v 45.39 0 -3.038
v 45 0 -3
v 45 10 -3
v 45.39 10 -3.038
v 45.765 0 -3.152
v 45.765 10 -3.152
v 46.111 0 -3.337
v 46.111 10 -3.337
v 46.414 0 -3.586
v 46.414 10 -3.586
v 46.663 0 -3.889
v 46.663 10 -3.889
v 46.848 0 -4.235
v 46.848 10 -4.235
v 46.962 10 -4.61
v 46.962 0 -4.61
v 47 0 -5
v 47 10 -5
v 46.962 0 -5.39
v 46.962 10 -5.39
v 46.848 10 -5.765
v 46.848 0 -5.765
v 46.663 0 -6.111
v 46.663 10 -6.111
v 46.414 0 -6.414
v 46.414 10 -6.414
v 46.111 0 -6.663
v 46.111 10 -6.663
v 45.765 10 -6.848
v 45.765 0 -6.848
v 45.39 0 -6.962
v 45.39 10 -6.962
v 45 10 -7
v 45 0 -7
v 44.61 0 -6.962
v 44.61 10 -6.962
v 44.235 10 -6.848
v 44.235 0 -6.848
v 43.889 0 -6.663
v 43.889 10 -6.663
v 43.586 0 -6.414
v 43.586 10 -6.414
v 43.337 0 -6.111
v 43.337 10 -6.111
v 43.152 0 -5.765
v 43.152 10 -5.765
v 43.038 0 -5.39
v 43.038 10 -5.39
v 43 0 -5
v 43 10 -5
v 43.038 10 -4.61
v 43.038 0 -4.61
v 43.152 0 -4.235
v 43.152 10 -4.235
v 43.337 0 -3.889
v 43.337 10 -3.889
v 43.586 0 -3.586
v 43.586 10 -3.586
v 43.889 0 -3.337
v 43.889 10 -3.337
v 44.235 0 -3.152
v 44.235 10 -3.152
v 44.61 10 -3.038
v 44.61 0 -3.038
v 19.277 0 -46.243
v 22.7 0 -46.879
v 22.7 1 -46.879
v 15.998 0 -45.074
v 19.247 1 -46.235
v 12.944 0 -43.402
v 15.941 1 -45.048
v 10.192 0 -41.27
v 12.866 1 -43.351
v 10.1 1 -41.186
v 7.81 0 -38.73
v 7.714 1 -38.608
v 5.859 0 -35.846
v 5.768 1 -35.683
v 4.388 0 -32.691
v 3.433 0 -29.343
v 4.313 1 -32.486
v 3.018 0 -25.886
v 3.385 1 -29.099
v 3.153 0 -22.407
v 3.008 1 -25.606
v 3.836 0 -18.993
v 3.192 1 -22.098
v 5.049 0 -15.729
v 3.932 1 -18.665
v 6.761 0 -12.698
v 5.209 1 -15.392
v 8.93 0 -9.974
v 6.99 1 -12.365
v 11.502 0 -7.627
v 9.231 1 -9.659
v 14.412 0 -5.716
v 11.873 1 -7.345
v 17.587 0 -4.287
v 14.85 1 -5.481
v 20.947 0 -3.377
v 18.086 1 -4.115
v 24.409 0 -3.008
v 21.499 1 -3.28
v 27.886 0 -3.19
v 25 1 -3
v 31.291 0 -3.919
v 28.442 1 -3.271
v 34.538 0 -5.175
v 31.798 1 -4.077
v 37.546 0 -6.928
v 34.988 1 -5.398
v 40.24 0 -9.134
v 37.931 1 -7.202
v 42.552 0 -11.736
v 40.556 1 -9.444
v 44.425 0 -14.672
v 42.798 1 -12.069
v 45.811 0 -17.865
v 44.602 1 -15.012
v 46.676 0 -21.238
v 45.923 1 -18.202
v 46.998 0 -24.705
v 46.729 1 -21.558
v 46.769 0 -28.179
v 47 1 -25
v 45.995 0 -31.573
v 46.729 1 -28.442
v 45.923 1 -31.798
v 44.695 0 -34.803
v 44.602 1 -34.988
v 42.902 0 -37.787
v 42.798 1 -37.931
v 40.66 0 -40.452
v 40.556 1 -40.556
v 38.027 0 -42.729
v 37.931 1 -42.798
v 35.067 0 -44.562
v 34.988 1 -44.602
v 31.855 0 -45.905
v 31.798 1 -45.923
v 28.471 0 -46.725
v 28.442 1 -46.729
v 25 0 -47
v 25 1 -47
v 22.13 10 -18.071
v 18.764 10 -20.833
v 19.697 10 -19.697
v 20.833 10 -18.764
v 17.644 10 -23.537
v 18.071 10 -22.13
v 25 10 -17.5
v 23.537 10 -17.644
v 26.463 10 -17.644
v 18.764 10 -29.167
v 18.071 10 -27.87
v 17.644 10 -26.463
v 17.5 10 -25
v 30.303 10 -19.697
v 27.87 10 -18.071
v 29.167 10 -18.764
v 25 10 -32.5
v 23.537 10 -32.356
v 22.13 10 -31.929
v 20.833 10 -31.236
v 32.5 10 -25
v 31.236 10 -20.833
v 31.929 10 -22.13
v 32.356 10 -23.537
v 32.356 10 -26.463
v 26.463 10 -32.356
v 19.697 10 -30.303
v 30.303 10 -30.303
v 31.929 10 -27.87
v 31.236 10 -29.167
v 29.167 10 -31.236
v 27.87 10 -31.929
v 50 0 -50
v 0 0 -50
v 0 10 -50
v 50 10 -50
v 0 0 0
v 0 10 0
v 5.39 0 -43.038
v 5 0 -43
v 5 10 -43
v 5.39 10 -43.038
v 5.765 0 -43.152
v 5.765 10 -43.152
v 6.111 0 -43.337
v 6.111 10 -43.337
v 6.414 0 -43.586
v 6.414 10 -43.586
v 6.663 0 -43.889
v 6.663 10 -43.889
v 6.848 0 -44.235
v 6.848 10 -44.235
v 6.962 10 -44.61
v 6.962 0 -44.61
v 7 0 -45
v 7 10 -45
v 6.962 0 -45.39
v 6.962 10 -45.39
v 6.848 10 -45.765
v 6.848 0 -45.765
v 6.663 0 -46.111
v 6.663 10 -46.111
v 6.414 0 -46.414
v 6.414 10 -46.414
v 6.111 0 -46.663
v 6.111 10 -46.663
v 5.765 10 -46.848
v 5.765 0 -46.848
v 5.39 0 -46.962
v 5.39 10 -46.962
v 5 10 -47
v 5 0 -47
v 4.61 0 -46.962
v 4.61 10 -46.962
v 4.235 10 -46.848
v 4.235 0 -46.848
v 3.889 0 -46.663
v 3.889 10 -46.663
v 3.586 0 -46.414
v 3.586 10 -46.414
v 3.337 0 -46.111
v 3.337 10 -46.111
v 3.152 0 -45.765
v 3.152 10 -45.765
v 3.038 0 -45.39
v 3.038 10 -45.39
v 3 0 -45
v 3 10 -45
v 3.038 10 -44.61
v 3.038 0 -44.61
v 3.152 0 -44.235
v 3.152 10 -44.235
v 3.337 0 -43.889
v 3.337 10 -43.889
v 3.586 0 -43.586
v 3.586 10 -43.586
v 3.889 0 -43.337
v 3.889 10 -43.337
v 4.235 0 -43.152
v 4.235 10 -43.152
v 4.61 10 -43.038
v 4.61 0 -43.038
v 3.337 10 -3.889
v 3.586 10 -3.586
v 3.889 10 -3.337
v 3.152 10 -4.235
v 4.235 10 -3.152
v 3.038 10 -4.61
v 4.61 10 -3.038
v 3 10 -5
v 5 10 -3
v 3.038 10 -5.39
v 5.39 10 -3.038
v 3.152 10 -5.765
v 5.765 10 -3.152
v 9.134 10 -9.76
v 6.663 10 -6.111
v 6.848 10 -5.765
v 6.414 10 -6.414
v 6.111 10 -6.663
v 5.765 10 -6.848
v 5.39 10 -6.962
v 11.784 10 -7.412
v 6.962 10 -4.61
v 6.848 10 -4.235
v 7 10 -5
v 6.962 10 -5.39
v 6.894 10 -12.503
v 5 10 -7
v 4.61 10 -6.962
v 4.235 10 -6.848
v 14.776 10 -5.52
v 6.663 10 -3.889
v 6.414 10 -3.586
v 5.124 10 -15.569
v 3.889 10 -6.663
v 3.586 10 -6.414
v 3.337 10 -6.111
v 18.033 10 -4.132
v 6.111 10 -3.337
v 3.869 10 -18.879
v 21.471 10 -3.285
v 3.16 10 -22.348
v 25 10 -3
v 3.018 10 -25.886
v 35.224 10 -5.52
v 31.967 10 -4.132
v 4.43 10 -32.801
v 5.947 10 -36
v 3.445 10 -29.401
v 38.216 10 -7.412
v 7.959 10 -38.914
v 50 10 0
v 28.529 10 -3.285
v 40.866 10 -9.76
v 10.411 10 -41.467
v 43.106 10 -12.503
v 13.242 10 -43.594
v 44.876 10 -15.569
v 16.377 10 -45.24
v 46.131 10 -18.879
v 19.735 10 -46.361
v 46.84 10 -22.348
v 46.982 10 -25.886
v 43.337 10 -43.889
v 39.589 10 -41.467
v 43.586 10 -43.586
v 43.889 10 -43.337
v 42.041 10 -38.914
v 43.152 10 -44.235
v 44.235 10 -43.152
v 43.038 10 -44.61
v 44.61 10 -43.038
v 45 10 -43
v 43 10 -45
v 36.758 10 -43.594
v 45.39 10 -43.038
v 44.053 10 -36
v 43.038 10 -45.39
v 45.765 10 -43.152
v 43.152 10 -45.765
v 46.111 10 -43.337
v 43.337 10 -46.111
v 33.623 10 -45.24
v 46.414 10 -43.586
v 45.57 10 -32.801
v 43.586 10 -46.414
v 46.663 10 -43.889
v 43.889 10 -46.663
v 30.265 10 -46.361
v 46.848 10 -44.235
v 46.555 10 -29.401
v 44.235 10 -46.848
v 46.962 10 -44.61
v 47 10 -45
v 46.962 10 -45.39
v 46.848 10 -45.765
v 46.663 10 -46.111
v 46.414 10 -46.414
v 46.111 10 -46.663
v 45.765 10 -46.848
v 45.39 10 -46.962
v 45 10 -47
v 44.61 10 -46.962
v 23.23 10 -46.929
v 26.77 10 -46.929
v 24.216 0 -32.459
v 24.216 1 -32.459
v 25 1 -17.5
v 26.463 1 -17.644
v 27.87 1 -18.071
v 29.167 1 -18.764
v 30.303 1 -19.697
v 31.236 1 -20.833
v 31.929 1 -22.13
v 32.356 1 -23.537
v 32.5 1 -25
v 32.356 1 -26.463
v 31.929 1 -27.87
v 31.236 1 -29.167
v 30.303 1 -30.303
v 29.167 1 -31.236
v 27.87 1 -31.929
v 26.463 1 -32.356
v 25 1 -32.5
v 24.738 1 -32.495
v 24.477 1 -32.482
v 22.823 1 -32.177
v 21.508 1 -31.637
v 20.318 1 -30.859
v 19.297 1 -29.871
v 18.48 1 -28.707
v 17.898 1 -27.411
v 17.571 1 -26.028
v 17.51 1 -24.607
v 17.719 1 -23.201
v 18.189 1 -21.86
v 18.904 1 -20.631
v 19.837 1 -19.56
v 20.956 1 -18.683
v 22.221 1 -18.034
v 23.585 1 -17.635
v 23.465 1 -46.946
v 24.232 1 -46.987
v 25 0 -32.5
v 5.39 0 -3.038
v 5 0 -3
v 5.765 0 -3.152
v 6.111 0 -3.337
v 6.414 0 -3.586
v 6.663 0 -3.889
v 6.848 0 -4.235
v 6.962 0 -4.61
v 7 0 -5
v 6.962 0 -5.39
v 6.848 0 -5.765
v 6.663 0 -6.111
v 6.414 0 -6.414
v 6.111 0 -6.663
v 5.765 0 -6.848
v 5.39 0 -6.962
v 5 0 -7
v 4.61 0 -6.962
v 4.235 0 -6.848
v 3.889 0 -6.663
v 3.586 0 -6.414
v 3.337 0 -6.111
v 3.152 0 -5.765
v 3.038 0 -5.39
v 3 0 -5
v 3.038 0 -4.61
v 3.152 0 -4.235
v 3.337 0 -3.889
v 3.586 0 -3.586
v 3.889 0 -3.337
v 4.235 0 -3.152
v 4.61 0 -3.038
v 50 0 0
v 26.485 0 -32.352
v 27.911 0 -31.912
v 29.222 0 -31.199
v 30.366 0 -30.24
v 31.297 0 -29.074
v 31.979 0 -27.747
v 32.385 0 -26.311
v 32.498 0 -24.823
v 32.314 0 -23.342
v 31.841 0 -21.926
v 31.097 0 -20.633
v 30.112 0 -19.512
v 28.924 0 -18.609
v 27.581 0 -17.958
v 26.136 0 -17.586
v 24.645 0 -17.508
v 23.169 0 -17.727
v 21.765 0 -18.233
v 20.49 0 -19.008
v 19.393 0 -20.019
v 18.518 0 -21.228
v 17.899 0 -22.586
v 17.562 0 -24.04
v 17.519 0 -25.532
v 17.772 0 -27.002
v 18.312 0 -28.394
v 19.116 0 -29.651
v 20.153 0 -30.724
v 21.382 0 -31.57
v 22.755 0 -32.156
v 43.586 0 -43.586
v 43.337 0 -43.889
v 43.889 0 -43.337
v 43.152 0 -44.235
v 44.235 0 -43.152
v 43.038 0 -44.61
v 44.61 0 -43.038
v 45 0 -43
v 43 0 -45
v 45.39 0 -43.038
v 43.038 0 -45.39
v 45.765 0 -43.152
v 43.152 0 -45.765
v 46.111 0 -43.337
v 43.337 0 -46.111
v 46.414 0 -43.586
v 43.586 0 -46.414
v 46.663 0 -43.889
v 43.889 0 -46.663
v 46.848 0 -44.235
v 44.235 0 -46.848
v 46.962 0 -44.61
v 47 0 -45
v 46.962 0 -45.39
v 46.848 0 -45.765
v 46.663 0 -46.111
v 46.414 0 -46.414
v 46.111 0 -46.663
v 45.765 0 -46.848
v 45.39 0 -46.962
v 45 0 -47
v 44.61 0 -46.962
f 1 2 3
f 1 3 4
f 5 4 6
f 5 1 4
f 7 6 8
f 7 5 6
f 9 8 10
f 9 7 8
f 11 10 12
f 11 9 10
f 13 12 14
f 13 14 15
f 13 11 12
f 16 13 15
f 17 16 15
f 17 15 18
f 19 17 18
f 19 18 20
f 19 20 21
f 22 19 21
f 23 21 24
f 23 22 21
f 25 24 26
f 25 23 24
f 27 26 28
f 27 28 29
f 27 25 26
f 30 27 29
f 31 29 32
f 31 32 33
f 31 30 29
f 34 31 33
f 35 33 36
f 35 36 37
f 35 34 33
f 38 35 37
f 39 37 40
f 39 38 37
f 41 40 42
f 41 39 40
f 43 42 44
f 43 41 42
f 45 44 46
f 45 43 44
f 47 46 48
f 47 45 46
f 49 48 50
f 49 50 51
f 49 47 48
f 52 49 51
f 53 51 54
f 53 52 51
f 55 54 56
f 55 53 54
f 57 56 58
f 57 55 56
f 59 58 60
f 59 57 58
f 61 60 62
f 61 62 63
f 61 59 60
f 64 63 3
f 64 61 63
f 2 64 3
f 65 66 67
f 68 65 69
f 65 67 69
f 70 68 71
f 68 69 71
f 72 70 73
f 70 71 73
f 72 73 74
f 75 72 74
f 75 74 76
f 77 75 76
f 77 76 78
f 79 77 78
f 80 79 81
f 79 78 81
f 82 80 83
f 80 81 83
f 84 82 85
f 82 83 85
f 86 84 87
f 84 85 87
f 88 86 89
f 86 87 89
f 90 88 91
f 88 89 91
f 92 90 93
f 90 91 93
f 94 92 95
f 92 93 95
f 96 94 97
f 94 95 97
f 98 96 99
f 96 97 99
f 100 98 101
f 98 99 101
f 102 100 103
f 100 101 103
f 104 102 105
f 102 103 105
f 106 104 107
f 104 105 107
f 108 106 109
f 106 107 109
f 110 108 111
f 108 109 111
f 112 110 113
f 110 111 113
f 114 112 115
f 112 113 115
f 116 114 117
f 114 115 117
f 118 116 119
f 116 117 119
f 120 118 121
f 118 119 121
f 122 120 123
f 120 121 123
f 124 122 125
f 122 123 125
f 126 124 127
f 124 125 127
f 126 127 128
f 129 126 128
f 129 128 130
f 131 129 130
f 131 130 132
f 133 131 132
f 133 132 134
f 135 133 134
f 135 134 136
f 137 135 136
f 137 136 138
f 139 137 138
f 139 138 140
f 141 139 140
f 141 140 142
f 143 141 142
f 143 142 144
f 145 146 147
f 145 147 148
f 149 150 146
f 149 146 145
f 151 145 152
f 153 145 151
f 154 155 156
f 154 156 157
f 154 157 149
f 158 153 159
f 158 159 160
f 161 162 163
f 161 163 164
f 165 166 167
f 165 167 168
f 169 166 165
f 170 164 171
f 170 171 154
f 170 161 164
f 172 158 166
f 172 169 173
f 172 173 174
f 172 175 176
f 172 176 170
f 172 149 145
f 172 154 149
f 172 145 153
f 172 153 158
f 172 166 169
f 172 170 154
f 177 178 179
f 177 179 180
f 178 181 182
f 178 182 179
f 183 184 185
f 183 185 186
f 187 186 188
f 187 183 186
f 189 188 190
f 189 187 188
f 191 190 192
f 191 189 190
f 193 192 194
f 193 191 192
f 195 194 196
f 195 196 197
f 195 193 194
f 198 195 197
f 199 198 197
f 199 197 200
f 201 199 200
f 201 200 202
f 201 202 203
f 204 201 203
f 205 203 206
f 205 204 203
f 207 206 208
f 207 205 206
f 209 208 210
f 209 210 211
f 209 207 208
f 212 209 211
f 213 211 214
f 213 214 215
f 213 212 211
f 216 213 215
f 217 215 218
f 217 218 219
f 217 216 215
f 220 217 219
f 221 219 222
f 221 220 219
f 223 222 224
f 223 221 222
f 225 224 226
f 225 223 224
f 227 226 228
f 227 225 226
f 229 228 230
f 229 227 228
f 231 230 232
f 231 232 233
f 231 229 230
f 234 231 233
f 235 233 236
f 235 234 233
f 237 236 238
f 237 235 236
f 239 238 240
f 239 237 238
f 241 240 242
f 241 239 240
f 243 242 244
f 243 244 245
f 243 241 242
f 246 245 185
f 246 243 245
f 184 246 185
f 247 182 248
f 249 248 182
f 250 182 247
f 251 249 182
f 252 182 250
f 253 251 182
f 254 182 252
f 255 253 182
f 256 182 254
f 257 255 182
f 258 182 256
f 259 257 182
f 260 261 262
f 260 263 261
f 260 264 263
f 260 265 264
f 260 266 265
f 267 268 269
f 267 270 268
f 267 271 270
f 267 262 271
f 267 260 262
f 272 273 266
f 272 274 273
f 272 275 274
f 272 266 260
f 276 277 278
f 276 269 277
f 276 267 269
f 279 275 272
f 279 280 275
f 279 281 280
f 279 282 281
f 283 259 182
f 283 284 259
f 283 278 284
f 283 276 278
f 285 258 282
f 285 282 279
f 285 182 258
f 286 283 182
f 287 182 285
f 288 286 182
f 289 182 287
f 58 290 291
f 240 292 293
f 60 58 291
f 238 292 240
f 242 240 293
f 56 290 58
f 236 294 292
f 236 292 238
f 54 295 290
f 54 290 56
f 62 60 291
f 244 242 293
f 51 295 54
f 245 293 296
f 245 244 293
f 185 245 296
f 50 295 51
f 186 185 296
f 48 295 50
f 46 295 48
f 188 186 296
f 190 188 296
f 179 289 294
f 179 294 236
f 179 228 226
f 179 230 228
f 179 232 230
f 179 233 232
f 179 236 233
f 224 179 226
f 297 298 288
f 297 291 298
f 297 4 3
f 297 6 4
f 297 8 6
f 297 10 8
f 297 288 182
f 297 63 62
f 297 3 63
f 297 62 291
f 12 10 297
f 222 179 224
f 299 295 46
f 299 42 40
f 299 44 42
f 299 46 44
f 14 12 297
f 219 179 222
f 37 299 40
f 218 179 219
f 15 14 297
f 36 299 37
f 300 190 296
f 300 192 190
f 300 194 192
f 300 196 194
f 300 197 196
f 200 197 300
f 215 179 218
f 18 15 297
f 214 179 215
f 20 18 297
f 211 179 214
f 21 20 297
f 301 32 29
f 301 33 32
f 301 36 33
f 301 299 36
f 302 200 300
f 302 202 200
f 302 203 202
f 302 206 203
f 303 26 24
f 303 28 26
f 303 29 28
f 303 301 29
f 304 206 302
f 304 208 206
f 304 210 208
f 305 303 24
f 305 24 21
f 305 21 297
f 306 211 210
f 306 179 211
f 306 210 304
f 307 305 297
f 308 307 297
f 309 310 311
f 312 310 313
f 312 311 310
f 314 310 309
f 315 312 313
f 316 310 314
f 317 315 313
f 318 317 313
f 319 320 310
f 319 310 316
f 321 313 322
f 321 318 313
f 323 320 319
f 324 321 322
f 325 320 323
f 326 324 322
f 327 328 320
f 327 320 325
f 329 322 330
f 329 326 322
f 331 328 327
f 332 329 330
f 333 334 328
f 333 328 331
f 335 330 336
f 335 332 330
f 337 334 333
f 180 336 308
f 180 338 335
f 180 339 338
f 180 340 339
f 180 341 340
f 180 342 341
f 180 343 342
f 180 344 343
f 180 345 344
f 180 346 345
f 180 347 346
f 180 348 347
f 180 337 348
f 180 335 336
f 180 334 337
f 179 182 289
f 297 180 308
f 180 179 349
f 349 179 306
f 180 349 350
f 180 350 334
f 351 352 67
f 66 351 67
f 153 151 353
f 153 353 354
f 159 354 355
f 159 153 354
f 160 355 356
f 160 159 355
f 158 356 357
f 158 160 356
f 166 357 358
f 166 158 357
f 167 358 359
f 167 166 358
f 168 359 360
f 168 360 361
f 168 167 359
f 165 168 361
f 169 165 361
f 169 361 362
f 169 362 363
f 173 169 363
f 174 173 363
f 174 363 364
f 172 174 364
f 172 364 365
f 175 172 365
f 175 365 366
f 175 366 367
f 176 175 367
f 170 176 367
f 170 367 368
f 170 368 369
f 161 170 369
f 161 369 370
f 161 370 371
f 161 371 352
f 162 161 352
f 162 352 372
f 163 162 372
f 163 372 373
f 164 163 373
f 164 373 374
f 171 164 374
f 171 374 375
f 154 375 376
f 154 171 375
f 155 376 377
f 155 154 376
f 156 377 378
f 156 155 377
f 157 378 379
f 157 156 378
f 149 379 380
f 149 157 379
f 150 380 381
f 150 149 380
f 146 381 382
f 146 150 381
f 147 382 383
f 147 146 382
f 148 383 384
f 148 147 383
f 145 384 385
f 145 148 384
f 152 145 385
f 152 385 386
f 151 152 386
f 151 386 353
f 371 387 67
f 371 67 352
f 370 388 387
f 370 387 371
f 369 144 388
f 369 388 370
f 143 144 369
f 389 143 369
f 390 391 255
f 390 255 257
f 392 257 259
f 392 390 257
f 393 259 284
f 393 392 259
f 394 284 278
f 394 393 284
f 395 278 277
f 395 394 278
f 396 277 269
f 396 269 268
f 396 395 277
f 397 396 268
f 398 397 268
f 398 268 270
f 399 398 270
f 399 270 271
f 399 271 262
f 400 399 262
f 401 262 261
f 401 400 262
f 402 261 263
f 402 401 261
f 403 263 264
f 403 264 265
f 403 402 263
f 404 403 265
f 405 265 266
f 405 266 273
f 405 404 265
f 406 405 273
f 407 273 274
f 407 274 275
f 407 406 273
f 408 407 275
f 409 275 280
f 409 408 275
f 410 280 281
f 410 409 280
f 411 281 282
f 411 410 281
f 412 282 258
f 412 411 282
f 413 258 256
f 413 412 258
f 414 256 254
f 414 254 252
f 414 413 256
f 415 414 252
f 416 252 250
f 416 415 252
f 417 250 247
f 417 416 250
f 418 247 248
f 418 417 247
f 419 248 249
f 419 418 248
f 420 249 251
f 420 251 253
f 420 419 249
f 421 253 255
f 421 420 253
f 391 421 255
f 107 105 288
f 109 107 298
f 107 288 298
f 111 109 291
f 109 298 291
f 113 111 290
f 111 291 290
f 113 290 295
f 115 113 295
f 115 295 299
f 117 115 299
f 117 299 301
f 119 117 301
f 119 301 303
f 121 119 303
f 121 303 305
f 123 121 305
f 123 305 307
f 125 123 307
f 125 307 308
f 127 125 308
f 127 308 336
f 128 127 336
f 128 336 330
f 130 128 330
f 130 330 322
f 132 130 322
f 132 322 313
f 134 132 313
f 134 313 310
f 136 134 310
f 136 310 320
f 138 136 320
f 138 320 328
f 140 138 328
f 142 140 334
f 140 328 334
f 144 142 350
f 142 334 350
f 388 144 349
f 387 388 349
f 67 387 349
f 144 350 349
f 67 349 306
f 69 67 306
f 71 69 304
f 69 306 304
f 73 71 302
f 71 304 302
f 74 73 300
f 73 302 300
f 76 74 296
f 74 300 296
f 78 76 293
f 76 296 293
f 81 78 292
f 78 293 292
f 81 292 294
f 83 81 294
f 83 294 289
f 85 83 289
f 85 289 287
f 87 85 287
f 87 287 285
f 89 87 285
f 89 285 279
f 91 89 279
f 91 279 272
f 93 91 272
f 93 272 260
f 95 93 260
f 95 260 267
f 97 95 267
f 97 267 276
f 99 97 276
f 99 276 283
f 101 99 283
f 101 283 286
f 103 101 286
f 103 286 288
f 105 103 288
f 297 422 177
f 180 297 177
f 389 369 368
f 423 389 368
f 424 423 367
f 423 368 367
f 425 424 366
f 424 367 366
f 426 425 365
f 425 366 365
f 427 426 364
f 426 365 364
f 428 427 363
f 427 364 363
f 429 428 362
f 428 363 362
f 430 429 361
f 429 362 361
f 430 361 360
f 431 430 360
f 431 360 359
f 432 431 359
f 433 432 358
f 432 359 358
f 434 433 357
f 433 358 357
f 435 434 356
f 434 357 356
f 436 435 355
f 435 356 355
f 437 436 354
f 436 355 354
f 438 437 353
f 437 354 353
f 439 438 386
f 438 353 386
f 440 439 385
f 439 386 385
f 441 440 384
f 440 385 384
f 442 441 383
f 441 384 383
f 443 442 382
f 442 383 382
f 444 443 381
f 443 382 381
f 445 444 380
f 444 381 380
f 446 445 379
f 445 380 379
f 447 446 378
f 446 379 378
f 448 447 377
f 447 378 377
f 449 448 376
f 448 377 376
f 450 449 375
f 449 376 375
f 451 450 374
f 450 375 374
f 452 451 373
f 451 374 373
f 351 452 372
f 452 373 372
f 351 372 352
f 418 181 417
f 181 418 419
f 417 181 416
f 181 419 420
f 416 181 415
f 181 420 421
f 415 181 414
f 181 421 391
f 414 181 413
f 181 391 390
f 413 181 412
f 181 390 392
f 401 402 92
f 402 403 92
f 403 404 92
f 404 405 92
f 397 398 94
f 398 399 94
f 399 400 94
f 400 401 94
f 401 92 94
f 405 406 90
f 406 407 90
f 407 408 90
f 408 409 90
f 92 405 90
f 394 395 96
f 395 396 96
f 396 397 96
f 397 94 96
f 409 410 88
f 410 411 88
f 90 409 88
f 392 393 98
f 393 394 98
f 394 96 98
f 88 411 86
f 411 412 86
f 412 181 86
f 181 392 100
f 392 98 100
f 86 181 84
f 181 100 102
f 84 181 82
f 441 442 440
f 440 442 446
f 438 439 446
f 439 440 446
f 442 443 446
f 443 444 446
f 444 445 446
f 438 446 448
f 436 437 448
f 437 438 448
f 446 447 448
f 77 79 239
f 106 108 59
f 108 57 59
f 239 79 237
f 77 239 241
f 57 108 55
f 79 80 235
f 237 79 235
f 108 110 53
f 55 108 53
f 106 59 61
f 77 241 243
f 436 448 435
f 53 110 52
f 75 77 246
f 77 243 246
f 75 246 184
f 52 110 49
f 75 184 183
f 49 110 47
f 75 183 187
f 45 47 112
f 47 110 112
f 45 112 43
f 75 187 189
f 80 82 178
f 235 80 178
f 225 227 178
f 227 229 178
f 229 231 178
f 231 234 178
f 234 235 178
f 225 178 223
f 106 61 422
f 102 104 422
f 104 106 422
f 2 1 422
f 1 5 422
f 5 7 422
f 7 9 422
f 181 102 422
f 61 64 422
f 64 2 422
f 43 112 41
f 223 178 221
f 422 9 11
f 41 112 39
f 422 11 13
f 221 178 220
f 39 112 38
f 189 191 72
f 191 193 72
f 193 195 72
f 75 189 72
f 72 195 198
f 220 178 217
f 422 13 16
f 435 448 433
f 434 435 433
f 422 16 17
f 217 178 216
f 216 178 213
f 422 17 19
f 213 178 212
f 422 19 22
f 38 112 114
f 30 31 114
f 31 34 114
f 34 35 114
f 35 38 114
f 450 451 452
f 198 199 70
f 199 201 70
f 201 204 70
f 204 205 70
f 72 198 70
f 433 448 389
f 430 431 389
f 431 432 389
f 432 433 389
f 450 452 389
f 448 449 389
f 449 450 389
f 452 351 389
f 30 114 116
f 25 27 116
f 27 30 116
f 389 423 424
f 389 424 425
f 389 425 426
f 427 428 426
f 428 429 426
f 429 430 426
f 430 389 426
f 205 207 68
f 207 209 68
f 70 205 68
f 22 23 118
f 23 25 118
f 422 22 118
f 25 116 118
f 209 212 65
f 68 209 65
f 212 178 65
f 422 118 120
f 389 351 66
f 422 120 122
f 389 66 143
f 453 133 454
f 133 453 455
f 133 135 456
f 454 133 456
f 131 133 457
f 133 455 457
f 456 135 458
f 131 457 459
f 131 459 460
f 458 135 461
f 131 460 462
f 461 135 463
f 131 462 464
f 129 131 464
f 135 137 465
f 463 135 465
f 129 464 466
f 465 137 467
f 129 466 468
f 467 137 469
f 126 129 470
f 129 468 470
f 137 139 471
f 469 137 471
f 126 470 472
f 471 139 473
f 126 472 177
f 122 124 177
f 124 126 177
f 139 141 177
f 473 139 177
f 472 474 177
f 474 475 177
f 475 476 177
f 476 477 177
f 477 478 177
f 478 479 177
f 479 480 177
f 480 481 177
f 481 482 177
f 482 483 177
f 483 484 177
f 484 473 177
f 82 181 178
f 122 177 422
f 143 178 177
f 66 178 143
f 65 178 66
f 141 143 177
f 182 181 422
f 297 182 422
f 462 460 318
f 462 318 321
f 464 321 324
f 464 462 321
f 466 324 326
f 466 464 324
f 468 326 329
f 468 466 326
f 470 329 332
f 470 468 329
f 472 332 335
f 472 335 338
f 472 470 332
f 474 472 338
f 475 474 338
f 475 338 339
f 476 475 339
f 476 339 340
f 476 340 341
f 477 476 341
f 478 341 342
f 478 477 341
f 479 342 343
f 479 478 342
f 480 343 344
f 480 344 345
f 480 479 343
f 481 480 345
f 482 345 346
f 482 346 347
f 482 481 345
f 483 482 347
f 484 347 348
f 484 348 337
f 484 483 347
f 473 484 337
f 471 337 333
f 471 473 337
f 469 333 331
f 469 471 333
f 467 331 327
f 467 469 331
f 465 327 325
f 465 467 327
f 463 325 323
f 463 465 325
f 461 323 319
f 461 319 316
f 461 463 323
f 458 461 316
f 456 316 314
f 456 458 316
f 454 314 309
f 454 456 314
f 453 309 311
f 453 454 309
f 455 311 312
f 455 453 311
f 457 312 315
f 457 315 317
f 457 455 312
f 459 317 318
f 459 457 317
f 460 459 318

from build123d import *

# Parameters (mm, degrees)
SKETCH_1_W          = 50
SKETCH_1_H          = 50
SKETCH_1_R          = 2
EXTRUDE_1_DEPTH     = 10
SKETCH_2_R          = 22
SKETCH_2_R_2        = 7.5
CUT_EXTRUDE_2_DEPTH = 9
CUT_EXTRUDE_3_DEPTH = 1


with BuildPart() as part:
    # 草图1 → 凸台-拉伸1 (new body)
    with BuildSketch(Plane(origin=(0, 0, 0), x_dir=(1, 0, 0), z_dir=(0, 1, 0))):
        with Locations((25, 25)):
            Rectangle(SKETCH_1_W, SKETCH_1_H)
        with Locations(Location((5, 45, 0), (0, 0, 270))):
            Circle(SKETCH_1_R, mode=Mode.SUBTRACT)
        with Locations(Location((45, 45, 0), (0, 0, 270))):
            Circle(SKETCH_1_R, mode=Mode.SUBTRACT)
        with Locations(Location((45, 5, 0), (0, 0, 270))):
            Circle(SKETCH_1_R, mode=Mode.SUBTRACT)
        with Locations(Location((5, 5, 0), (0, 0, 270))):
            Circle(SKETCH_1_R, mode=Mode.SUBTRACT)
    extrude(amount=EXTRUDE_1_DEPTH)

    # 草图2 → 切除-拉伸2 (cut)
    with BuildSketch(Plane(origin=(0, 10, 0), x_dir=(1, 0, 0), z_dir=(0, 1, 0))):
        with Locations(Location((25, 25, 0), (0, 0, 270))):
            Circle(SKETCH_2_R)
        with Locations(Location((25, 25, 0), (0, 0, 270))):
            Circle(SKETCH_2_R_2, mode=Mode.SUBTRACT)
    extrude(amount=-CUT_EXTRUDE_2_DEPTH, mode=Mode.SUBTRACT)

    # 草图3 → 切除-拉伸3 (cut)
    with BuildSketch(Plane(origin=(0, 1, 0), x_dir=(1, 0, 0), z_dir=(0, 1, 0))):
        with BuildLine():
            Line((24.216036525, 32.458914215), (22.700373808, 46.879481698))
            ThreePointArc((22.700373808, 46.879481698), (26.151391037, 3.030150235), (25, 47))
            Line((25, 47), (25, 32.5))
            ThreePointArc((25, 32.5), (25.392519672, 17.510278489), (24.216036525, 32.458914215))
        make_face()
    extrude(amount=-CUT_EXTRUDE_3_DEPTH, mode=Mode.SUBTRACT)


solid = part.part
